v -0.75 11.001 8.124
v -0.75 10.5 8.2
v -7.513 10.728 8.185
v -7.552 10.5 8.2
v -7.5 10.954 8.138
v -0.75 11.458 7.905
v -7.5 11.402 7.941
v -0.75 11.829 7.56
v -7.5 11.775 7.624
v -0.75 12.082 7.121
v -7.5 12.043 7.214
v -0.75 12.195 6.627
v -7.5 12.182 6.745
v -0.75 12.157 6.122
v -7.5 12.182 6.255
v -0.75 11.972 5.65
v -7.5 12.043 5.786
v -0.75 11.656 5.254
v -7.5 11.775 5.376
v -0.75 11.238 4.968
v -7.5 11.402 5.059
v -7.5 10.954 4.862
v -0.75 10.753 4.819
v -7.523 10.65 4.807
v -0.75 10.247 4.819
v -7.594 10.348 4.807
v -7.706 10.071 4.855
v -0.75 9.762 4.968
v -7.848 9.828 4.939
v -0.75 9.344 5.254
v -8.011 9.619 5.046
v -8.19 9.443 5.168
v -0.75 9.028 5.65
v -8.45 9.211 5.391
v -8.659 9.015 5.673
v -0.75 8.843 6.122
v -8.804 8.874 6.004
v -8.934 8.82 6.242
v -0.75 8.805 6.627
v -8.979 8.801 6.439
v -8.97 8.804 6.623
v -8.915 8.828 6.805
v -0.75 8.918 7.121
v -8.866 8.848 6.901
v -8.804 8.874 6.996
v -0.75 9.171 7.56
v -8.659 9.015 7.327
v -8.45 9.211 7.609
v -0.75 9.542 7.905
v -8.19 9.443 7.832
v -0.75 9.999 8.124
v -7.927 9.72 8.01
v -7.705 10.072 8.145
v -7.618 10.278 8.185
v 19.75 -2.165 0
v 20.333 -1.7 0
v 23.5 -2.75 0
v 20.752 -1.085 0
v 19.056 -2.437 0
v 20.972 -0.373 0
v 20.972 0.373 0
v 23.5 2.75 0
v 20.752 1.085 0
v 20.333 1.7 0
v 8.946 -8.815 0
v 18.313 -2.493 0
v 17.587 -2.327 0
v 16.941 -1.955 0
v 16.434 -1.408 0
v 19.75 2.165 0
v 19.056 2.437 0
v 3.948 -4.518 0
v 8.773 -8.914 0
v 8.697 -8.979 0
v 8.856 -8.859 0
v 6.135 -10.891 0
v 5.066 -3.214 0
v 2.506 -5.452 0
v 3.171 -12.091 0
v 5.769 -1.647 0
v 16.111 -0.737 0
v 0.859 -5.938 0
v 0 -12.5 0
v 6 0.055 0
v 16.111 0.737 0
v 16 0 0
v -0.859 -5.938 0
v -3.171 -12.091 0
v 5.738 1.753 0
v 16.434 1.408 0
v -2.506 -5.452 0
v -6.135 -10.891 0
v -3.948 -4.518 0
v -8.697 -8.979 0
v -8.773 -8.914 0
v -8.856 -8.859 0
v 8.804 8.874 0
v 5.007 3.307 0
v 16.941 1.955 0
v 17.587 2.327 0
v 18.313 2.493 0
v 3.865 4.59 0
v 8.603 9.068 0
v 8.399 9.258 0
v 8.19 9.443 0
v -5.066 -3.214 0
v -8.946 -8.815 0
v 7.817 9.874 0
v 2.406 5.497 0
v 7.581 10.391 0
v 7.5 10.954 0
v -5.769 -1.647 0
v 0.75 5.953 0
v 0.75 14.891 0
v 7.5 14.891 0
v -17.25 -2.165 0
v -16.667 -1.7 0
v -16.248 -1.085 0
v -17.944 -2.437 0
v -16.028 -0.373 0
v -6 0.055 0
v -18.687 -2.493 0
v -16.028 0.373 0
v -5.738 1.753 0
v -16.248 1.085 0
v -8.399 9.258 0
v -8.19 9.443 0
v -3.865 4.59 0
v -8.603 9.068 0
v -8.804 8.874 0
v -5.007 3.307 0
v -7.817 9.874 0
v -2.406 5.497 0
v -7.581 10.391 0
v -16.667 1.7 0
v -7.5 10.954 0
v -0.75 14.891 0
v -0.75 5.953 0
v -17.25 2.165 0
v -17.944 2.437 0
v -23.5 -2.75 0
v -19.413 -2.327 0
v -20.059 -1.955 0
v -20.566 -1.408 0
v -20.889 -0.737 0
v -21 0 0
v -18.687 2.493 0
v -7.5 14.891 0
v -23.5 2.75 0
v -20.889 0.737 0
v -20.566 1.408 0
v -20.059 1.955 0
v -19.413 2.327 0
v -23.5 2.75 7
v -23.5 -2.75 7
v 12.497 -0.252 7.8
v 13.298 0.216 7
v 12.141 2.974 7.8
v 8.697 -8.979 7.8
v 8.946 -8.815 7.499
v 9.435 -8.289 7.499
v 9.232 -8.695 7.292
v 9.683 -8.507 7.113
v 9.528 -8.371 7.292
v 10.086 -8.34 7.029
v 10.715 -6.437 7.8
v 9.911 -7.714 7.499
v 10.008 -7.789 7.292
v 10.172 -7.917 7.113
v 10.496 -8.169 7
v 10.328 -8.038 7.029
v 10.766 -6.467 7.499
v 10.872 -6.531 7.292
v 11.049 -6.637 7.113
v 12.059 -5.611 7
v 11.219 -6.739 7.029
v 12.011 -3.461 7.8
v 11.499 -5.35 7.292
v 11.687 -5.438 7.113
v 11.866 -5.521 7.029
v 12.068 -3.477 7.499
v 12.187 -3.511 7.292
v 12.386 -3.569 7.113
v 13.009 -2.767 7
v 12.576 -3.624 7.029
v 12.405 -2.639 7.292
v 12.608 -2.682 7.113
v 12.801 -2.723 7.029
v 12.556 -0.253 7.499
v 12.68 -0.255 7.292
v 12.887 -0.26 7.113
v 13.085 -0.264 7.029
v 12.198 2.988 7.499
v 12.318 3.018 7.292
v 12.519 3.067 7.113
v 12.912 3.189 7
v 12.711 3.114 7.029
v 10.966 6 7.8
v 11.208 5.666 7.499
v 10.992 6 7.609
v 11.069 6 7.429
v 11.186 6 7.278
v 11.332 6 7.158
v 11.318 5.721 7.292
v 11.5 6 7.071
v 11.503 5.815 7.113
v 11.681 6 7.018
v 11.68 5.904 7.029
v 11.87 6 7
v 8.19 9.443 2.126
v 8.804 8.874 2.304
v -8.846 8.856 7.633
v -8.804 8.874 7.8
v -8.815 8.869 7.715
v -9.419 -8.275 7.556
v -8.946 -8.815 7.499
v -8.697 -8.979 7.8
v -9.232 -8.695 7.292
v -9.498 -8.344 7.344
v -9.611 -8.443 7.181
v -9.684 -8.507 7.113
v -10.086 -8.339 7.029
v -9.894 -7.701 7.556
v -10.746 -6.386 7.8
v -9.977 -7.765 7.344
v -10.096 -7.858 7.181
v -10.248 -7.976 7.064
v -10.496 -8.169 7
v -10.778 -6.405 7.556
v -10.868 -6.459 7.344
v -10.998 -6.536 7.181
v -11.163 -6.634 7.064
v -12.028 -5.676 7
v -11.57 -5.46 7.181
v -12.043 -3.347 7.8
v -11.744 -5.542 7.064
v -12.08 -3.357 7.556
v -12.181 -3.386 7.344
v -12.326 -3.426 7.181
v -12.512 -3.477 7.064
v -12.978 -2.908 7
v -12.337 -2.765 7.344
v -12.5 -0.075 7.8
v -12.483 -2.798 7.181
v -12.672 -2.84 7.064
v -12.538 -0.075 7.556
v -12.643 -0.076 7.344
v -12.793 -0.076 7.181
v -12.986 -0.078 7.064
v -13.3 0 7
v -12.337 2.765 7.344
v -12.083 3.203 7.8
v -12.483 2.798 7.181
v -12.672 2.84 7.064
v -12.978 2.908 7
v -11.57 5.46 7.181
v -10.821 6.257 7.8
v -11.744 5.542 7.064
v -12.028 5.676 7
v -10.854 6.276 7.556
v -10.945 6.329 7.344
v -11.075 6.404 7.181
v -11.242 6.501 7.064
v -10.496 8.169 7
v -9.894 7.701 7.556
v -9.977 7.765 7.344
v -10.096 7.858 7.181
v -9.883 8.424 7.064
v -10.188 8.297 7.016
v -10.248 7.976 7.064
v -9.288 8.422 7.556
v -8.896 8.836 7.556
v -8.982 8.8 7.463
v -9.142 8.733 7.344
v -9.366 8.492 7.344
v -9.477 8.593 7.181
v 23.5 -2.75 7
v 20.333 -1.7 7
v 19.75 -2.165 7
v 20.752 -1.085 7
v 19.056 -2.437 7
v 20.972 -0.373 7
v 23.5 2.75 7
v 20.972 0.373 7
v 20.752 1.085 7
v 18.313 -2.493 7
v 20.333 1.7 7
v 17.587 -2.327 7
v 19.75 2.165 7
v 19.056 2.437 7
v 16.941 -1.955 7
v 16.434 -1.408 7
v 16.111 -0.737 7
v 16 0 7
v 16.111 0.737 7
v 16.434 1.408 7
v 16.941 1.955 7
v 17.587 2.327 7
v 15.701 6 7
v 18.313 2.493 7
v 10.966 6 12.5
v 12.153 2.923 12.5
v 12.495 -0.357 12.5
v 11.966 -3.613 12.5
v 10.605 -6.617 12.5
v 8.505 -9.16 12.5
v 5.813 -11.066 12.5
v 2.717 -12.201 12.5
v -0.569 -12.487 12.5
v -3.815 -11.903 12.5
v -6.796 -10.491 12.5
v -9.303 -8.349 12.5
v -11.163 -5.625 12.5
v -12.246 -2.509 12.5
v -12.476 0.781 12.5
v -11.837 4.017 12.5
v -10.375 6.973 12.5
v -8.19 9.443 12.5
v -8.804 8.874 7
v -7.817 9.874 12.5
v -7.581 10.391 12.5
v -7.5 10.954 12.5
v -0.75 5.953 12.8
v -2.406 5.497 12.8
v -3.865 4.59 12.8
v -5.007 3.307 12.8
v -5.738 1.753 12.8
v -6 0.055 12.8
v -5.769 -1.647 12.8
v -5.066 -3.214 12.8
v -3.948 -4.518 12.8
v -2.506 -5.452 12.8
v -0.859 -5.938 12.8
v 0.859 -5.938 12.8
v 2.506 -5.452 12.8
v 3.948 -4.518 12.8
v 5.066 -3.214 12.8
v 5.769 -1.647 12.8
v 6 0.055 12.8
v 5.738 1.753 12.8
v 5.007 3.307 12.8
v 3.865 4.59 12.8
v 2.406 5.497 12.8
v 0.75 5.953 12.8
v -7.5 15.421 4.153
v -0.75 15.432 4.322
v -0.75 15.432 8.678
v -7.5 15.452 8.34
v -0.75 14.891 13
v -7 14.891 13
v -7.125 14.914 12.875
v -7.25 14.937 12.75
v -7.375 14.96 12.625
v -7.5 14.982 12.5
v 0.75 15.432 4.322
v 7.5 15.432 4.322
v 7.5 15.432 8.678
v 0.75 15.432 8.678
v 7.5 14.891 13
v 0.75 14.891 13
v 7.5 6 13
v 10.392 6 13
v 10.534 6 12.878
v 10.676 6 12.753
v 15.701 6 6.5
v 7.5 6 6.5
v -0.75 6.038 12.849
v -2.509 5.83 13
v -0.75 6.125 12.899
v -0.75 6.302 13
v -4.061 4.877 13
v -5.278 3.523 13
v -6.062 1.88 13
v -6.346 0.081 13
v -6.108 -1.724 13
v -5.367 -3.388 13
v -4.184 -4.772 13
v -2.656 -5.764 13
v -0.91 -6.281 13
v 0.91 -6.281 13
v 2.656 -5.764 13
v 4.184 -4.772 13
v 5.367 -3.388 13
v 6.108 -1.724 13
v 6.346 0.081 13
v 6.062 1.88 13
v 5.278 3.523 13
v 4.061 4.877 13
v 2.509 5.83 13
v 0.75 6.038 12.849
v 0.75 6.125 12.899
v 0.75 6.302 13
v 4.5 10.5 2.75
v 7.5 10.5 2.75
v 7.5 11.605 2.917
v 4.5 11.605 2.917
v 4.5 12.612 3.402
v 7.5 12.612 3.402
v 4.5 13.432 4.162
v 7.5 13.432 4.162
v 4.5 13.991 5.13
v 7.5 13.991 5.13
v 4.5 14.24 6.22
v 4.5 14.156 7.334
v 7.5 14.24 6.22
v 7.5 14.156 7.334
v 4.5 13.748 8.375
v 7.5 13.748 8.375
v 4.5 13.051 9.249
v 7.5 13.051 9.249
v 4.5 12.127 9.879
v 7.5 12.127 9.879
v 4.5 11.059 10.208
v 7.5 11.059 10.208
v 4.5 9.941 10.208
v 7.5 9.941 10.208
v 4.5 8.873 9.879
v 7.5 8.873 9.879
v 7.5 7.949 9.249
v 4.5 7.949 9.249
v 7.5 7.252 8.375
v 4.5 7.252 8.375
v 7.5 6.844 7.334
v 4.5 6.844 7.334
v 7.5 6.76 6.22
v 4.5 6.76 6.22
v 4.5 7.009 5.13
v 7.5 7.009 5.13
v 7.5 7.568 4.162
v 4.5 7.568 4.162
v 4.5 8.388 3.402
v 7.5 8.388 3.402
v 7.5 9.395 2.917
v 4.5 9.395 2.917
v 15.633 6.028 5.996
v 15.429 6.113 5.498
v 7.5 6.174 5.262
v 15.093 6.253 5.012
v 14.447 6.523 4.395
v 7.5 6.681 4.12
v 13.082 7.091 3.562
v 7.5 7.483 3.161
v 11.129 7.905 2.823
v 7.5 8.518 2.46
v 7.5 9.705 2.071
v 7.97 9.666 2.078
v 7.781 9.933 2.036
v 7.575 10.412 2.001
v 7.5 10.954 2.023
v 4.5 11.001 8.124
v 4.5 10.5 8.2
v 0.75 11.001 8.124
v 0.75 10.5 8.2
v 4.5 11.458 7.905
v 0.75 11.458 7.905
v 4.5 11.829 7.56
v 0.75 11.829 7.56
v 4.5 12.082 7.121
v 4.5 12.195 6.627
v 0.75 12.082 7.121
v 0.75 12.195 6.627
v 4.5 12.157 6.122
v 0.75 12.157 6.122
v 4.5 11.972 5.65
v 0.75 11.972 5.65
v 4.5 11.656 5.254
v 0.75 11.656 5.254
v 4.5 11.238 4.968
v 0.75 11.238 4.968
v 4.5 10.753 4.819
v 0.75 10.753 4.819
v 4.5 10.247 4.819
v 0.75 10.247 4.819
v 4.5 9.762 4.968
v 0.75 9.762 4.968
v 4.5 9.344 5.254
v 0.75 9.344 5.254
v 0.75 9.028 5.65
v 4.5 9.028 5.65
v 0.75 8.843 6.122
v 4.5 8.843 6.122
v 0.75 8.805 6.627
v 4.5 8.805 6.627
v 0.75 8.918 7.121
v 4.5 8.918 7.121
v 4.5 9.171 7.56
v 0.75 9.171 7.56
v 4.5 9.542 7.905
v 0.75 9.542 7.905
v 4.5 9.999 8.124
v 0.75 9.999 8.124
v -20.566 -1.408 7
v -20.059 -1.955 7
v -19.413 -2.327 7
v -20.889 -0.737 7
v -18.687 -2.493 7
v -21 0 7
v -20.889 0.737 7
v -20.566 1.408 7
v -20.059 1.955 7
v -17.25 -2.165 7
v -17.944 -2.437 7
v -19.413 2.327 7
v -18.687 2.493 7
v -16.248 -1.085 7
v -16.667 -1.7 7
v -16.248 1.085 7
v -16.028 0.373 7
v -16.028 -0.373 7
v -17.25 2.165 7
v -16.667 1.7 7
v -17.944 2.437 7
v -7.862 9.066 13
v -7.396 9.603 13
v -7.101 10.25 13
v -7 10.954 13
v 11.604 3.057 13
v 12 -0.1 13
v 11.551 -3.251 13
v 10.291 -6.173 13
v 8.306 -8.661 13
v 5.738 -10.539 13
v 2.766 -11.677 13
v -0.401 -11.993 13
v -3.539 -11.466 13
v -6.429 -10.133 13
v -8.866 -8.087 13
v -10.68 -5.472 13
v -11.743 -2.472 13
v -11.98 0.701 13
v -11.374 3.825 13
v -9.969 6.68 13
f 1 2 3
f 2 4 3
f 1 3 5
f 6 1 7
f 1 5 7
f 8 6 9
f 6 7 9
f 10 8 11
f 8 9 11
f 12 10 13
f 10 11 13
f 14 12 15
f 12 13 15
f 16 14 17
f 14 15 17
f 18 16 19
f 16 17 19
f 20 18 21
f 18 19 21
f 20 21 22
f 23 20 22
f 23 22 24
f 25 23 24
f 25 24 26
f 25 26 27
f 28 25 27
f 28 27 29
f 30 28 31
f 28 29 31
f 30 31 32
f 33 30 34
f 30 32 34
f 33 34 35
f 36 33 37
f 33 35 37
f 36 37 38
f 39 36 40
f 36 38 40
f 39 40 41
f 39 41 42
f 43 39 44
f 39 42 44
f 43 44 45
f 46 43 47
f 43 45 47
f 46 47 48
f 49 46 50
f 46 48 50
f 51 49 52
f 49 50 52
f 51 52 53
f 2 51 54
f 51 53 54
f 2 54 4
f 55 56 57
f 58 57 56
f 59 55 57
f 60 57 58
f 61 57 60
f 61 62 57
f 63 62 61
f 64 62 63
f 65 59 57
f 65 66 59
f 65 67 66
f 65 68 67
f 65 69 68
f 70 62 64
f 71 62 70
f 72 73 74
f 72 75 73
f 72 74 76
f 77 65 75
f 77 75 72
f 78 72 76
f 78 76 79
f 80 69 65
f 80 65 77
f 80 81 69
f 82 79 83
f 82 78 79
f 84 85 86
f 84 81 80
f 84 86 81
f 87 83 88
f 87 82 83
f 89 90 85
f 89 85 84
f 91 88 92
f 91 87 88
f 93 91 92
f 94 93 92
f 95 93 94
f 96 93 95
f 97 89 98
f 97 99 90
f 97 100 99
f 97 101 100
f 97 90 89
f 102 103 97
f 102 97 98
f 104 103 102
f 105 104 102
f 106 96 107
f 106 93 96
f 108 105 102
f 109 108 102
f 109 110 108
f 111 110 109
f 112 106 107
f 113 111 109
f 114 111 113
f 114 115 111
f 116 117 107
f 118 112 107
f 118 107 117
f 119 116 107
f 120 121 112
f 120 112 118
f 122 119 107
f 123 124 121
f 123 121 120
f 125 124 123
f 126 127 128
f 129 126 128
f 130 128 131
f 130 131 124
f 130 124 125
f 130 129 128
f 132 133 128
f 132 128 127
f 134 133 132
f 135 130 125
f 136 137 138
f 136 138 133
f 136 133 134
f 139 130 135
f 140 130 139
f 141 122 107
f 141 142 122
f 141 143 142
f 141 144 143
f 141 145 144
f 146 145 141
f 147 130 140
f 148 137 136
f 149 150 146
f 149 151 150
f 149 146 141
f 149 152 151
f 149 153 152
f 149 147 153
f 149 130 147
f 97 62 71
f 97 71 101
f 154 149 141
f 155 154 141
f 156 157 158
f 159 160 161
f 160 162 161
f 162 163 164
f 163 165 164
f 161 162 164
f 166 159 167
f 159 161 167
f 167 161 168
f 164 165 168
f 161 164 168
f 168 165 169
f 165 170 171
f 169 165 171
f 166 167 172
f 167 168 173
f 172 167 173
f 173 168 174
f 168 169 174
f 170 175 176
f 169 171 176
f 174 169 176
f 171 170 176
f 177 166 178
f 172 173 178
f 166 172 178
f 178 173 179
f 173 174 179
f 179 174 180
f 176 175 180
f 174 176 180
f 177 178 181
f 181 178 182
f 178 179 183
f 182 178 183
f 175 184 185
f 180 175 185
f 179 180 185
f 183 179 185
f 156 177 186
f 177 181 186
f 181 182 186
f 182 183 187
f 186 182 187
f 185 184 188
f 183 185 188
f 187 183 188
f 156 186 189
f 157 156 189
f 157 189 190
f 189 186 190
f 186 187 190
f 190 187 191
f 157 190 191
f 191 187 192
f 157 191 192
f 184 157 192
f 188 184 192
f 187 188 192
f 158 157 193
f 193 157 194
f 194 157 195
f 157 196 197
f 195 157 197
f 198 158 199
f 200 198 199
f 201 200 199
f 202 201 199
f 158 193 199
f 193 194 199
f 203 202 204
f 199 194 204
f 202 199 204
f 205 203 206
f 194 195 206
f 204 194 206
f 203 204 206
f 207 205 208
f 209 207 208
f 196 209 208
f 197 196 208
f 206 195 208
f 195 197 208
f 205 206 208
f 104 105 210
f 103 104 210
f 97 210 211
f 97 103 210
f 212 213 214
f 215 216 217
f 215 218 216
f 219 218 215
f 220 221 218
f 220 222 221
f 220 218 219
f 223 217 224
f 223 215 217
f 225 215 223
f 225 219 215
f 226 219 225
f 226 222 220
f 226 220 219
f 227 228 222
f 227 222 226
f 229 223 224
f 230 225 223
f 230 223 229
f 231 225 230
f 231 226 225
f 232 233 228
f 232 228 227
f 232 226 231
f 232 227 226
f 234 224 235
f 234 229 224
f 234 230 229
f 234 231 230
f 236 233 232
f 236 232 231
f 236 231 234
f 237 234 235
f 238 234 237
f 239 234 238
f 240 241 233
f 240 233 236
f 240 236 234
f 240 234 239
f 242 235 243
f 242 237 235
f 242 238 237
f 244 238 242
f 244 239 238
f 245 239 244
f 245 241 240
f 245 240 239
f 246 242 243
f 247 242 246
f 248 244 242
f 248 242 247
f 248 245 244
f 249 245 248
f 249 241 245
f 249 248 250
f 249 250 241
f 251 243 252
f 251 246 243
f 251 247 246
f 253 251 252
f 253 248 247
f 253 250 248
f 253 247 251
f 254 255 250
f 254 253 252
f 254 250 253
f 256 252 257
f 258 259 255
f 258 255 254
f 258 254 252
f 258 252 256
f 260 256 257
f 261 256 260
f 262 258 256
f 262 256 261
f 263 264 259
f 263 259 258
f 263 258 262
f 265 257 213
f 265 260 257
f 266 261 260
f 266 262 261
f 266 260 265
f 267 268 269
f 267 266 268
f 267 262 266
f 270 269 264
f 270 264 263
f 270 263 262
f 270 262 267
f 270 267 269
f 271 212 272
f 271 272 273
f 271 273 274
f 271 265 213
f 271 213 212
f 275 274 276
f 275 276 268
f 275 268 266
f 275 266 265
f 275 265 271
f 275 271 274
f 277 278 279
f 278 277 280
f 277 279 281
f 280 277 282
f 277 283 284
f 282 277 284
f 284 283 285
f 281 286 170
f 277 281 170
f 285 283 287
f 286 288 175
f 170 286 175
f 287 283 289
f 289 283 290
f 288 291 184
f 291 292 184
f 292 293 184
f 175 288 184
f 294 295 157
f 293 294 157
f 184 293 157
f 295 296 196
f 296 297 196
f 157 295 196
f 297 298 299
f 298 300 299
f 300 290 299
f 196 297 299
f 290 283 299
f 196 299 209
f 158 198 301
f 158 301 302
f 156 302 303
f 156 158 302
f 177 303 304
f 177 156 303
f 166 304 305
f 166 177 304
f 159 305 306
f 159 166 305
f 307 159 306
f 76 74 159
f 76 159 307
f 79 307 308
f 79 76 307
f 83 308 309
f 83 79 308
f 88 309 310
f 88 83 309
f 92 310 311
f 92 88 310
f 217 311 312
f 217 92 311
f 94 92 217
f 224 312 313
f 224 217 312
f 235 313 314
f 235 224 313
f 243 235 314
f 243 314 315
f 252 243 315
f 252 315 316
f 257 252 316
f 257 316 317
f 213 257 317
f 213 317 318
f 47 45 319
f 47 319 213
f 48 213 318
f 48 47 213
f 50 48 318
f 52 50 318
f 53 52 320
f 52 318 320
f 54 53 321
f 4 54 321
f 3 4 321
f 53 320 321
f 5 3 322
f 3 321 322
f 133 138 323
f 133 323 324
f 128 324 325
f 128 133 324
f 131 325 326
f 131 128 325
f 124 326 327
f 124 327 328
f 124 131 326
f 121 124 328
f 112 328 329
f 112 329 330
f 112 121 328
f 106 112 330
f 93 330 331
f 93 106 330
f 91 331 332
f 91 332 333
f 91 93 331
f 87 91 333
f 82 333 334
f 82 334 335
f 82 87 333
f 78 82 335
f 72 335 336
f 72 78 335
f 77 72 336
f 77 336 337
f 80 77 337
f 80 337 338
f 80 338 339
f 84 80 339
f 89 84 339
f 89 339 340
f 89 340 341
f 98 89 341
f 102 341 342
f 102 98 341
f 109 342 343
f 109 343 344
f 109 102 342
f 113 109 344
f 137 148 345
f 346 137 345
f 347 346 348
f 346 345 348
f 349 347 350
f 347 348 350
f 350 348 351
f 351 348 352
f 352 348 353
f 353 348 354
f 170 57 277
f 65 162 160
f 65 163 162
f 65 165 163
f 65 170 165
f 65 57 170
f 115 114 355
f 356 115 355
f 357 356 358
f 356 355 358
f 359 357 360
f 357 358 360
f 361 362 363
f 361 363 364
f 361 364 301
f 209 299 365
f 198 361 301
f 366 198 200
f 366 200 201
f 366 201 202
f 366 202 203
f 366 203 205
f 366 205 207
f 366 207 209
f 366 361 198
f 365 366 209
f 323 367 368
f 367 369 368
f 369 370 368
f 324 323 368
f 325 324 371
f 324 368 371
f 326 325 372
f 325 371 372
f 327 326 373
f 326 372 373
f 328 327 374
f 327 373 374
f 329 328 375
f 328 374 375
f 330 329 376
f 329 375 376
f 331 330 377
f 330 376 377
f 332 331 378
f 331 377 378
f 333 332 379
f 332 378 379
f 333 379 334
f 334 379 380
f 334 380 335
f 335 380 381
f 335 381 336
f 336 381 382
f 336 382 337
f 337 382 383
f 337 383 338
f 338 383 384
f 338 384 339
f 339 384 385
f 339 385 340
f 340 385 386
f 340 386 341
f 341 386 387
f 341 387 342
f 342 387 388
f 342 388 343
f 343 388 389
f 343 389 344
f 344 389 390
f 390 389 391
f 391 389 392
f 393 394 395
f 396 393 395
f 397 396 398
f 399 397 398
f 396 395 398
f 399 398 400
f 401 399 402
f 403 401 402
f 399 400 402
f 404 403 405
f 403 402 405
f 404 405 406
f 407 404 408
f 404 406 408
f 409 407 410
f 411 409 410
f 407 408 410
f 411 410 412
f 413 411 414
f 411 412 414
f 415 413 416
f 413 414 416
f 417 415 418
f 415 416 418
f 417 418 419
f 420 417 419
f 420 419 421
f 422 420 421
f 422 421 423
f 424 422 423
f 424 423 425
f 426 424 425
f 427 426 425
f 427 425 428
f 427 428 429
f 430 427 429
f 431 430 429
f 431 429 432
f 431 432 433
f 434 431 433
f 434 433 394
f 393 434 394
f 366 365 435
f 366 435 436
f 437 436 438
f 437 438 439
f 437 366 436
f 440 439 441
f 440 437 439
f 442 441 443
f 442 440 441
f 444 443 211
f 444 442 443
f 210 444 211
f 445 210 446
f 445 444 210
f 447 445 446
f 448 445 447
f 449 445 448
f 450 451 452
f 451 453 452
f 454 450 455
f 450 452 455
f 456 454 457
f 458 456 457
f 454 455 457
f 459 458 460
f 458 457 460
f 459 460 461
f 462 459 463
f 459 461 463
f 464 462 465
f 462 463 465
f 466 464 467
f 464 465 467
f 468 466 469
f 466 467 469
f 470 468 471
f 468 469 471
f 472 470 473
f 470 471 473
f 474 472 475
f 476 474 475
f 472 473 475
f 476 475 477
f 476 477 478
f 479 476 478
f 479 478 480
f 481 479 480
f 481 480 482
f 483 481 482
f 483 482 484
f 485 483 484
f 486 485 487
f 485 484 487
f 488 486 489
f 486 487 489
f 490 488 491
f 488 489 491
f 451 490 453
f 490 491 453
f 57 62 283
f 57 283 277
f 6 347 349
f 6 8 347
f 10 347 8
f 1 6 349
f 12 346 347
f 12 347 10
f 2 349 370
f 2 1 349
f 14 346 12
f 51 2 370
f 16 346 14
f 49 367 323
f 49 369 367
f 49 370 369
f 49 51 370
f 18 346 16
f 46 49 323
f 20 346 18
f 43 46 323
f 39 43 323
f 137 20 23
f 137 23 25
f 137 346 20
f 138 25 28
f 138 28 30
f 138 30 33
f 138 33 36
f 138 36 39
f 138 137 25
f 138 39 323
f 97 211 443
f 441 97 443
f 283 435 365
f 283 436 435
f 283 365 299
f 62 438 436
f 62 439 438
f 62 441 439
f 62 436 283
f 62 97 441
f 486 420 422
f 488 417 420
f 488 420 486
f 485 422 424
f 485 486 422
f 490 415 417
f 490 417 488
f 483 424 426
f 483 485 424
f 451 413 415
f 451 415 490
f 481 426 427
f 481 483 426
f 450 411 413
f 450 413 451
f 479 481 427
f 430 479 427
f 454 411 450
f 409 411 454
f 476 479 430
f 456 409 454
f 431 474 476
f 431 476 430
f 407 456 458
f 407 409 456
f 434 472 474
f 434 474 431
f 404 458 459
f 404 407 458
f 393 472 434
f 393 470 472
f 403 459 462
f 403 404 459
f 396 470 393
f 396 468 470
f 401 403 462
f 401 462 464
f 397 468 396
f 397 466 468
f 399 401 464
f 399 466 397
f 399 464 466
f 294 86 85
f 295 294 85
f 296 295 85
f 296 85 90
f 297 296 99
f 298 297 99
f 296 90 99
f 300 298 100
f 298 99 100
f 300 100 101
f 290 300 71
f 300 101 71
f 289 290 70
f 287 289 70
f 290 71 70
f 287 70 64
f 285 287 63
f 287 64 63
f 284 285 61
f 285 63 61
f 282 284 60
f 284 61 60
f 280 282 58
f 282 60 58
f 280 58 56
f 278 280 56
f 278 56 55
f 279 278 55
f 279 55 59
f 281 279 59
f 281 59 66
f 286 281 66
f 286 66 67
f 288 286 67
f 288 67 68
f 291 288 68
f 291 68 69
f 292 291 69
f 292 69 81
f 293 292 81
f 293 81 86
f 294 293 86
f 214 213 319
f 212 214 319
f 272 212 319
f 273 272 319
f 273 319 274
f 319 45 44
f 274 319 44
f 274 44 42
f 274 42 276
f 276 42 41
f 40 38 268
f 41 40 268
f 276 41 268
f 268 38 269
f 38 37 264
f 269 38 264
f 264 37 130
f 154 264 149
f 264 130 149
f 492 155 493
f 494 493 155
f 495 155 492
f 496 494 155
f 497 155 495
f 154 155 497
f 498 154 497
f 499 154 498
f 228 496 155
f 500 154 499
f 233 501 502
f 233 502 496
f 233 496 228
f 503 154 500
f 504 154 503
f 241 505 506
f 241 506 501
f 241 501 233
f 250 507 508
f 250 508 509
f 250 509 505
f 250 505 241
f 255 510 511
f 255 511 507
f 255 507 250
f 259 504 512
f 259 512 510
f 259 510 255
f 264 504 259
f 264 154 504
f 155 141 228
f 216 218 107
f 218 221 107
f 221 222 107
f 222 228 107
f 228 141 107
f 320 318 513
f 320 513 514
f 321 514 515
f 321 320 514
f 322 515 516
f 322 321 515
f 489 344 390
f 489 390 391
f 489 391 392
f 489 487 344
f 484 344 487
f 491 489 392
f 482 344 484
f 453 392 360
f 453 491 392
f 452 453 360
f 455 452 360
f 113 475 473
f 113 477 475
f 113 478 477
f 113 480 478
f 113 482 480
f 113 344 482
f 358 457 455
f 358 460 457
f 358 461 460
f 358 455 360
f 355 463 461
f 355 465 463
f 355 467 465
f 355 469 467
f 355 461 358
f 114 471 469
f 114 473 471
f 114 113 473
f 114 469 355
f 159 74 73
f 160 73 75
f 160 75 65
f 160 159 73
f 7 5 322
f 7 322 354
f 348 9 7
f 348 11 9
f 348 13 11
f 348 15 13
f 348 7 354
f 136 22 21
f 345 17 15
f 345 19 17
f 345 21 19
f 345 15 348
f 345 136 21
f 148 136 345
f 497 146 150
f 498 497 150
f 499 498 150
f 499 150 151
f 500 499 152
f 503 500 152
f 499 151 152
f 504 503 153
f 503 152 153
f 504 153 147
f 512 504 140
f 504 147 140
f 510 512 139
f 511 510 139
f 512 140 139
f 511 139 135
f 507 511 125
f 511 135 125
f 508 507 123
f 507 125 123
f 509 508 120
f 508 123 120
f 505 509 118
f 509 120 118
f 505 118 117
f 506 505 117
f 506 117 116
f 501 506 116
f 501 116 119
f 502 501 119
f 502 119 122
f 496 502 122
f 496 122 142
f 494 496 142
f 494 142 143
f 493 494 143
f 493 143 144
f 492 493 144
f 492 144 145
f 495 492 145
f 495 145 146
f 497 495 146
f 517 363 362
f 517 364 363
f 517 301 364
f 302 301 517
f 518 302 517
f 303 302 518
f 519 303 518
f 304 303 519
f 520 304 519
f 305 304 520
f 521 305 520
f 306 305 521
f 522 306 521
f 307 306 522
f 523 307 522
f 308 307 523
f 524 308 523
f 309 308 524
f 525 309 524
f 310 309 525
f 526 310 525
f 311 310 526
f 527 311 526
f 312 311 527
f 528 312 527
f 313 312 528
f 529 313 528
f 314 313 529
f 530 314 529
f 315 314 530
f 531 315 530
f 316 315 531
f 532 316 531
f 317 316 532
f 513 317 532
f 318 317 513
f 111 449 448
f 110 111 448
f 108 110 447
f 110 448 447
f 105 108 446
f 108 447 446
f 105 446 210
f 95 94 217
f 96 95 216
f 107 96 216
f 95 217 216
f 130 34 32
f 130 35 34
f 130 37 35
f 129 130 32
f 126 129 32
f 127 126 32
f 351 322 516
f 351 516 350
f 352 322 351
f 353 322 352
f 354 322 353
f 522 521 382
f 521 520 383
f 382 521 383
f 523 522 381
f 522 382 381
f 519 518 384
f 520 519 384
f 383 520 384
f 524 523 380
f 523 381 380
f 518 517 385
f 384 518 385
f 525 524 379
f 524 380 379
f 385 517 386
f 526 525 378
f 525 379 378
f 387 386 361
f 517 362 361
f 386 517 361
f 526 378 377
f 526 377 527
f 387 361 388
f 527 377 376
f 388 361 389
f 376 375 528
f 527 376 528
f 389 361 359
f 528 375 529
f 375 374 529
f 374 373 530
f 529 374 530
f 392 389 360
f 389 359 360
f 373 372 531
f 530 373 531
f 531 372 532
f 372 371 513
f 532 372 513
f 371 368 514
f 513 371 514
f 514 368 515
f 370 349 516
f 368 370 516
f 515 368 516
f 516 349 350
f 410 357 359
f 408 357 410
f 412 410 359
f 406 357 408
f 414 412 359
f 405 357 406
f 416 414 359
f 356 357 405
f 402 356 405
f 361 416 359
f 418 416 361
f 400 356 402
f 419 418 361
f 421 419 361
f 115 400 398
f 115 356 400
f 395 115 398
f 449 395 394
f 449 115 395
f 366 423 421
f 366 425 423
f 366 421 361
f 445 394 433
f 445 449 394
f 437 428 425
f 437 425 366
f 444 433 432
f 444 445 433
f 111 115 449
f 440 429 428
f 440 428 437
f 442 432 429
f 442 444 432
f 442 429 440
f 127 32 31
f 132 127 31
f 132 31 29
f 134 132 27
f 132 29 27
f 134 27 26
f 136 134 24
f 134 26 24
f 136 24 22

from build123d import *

# Parameters (mm, degrees)
BOSS_EXTRUDE1_DEPTH                                 = 13
CUT_EXTRUDE1_DEPTH                                  = 24.780243901
CUT_EXTRUDE1_DEPTH_BACK                             = 24.780243901
FILLET1_R                                           = 2
BOSS_EXTRUDE2_DEPTH                                 = 7
HOLE_WIZARD_5_0_5_1_D                               = 5
HOLE_WIZARD_5_0_5_1_DEPTH                           = 10
HOLE_WIZARD_5_0_5_1_TIP                             = 1.502151548
CUT_EXTRUDE2_REACH                                  = 39.017
CBORE_FOR_M4_HEX_SOCKET_HEAD_CAP_SCREW3_D           = 3.4
CBORE_FOR_M4_HEX_SOCKET_HEAD_CAP_SCREW3_CBORE_D     = 7.5
CBORE_FOR_M4_HEX_SOCKET_HEAD_CAP_SCREW3_CBORE_DEPTH = 3
CHAMFER2_SIZE                                       = 0.5
FILLET2_R                                           = 0.8
CHAMFER3_SIZE                                       = 0.2
CHAMFER3_SIZE2                                      = 0.346410162


with BuildPart() as part:
    # Sketch1 → Boss-Extrude1 (new body)
    with BuildSketch(Plane.XY):
        with BuildLine():
            Line((0.75, 5.95294045), (0.75, 15.5))
            Line((0.75, 15.5), (7.5, 15.5))
            Line((7.5, 15.5), (7.5, 10))
            ThreePointArc((7.5, 10), (0, -12.5), (-7.5, 10))
            Line((-7.5, 10), (-7.5, 15.5))
            Line((-7.5, 15.5), (-0.75, 15.5))
            Line((-0.75, 15.5), (-0.75, 5.95294045))
            ThreePointArc((-0.75, 5.95294045), (0, -6), (0.75, 5.95294045))
        make_face()
    extrude(amount=BOSS_EXTRUDE1_DEPTH)

    # Sketch2 → Cut-Extrude1 (cut, two sides: drawn at the far end of the back side and taken through both)
    with BuildSketch(Plane(origin=(0, 0, 0), x_dir=(0, 0, -1), z_dir=(1, 0, 0)).offset(-CUT_EXTRUDE1_DEPTH_BACK)):
        with BuildLine():
            Line((69.410215856, 1.772448509), (0, 14.891132578))
            ThreePointArc((0, 14.891132578), (-6.5, 15.5), (-13, 14.891132578))
            Line((-13, 14.891132578), (-82.410215856, 1.772448509))
            Line((-82.410215856, 1.772448509), (-82.410215856, 143.050584636))
            Line((-82.410215856, 143.050584636), (69.410215856, 143.050584636))
            Line((69.410215856, 143.050584636), (69.410215856, 1.772448509))
        make_face()
    extrude(amount=CUT_EXTRUDE1_DEPTH + CUT_EXTRUDE1_DEPTH_BACK, mode=Mode.SUBTRACT)

    # Fillet1
    fillet1_edges = [part.edges().sort_by_distance(p)[0] for p in [
        (7.5, 10, 6.5),
        (-7.5, 10, 6.5),
    ]]
    fillet(fillet1_edges, radius=FILLET1_R)

    # Sketch3 → Boss-Extrude2 (add)
    with BuildSketch(Plane.XY):
        with BuildLine():
            Line((8.803538255, 8.873990883), (23.5, 2.75))
            Line((23.5, 2.75), (23.5, -2.75))
            Line((23.5, -2.75), (8.803538255, -8.873990883))
            ThreePointArc((8.803538255, -8.873990883), (12.5, 0), (8.803538255, 8.873990883))
        make_face()
    extrude(amount=BOSS_EXTRUDE2_DEPTH)

    # Mirror1: part across plane


with BuildPart() as part_1:
    add(part.part)
    add(part.part.mirror(Plane(origin=(0, 0, 0), x_dir=(0, 0, 1), z_dir=(1, 0, 0))))

    # Диаметр отверстия Ø5.0 (5)1
    with Locations(Plane.XY.offset(7)):
        with Locations((18.5, 0), (-18.5, 0)):
            Hole(HOLE_WIZARD_5_0_5_1_D / 2, depth=HOLE_WIZARD_5_0_5_1_DEPTH)
            with Locations((0, 0, -(HOLE_WIZARD_5_0_5_1_DEPTH + HOLE_WIZARD_5_0_5_1_TIP / 2))):  # 118° drill point
                Cone(0, HOLE_WIZARD_5_0_5_1_D / 2, HOLE_WIZARD_5_0_5_1_TIP, mode=Mode.SUBTRACT)

    # Sketch9 → Cut-Extrude2 (cut, up to next)
    with BuildSketch(Plane(origin=(7.5, 0, 0), x_dir=(0, 0, -1), z_dir=(1, 0, 0)), mode=Mode.PRIVATE) as cut_extrude2_sk1:
        with BuildLine():
            Line((-2.023006126, 10.95445115), (-13, 10.95445115))
            Line((-13, 10.95445115), (-13, 6))
            Line((-13, 6), (-6.5, 6))
            ThreePointArc((-6.5, 6), (-3.161210536, 7.482967532), (-2.023006126, 10.95445115))
        make_face()
    cut_extrude2_tool1 = extrude(cut_extrude2_sk1.sketch, amount=CUT_EXTRUDE2_REACH, mode=Mode.PRIVATE) & part_1.part
    add(cut_extrude2_tool1.solids().sort_by_distance((7.5, 8.604622, 7.889878))[0], mode=Mode.SUBTRACT)

    # CBORE for M4 Hex Socket Head Cap Screw3 (through all)
    with Locations(Plane(origin=(7.5, 0, 0), x_dir=(0, 0, -1), z_dir=(1, 0, 0))):
        with Locations((-6.5, 10.5)):
            CounterBoreHole(CBORE_FOR_M4_HEX_SOCKET_HEAD_CAP_SCREW3_D / 2, CBORE_FOR_M4_HEX_SOCKET_HEAD_CAP_SCREW3_CBORE_D / 2, CBORE_FOR_M4_HEX_SOCKET_HEAD_CAP_SCREW3_CBORE_DEPTH)

    # Chamfer2
    chamfer2_edges = [part_1.edges().sort_by_distance(p)[0] for p in [
        (-7.5, 12.922791864, 13),
        (-2.211613172, -12.302795096, 13),
        (-7.680564695, 10.123996352, 13),
    ]]
    chamfer(chamfer2_edges, length=CHAMFER2_SIZE)

    # Fillet2
    fillet2_edges = [part_1.edges().sort_by_distance(p)[0] for p in [
        (12.36996926, -1.798293779, 7),
        (8.803538255, -8.873990883, 3.5),
        (-12.5, 0, 7),
        (-8.803538255, -8.873990883, 3.5),
    ]]
    fillet(fillet2_edges, radius=FILLET2_R)

    # Chamfer3
    chamfer3_edges = [part_1.edges().sort_by_distance(p)[0] for p in [
        (0, -6, 13),
    ]]
    chamfer3_side = [part_1.faces().sort_by_distance(p)[0] for p in [
        (0, -6, 6.5),
    ]]
    chamfer(chamfer3_edges, length=CHAMFER3_SIZE, length2=CHAMFER3_SIZE2, reference=chamfer3_side[0])


solid = part_1.part
